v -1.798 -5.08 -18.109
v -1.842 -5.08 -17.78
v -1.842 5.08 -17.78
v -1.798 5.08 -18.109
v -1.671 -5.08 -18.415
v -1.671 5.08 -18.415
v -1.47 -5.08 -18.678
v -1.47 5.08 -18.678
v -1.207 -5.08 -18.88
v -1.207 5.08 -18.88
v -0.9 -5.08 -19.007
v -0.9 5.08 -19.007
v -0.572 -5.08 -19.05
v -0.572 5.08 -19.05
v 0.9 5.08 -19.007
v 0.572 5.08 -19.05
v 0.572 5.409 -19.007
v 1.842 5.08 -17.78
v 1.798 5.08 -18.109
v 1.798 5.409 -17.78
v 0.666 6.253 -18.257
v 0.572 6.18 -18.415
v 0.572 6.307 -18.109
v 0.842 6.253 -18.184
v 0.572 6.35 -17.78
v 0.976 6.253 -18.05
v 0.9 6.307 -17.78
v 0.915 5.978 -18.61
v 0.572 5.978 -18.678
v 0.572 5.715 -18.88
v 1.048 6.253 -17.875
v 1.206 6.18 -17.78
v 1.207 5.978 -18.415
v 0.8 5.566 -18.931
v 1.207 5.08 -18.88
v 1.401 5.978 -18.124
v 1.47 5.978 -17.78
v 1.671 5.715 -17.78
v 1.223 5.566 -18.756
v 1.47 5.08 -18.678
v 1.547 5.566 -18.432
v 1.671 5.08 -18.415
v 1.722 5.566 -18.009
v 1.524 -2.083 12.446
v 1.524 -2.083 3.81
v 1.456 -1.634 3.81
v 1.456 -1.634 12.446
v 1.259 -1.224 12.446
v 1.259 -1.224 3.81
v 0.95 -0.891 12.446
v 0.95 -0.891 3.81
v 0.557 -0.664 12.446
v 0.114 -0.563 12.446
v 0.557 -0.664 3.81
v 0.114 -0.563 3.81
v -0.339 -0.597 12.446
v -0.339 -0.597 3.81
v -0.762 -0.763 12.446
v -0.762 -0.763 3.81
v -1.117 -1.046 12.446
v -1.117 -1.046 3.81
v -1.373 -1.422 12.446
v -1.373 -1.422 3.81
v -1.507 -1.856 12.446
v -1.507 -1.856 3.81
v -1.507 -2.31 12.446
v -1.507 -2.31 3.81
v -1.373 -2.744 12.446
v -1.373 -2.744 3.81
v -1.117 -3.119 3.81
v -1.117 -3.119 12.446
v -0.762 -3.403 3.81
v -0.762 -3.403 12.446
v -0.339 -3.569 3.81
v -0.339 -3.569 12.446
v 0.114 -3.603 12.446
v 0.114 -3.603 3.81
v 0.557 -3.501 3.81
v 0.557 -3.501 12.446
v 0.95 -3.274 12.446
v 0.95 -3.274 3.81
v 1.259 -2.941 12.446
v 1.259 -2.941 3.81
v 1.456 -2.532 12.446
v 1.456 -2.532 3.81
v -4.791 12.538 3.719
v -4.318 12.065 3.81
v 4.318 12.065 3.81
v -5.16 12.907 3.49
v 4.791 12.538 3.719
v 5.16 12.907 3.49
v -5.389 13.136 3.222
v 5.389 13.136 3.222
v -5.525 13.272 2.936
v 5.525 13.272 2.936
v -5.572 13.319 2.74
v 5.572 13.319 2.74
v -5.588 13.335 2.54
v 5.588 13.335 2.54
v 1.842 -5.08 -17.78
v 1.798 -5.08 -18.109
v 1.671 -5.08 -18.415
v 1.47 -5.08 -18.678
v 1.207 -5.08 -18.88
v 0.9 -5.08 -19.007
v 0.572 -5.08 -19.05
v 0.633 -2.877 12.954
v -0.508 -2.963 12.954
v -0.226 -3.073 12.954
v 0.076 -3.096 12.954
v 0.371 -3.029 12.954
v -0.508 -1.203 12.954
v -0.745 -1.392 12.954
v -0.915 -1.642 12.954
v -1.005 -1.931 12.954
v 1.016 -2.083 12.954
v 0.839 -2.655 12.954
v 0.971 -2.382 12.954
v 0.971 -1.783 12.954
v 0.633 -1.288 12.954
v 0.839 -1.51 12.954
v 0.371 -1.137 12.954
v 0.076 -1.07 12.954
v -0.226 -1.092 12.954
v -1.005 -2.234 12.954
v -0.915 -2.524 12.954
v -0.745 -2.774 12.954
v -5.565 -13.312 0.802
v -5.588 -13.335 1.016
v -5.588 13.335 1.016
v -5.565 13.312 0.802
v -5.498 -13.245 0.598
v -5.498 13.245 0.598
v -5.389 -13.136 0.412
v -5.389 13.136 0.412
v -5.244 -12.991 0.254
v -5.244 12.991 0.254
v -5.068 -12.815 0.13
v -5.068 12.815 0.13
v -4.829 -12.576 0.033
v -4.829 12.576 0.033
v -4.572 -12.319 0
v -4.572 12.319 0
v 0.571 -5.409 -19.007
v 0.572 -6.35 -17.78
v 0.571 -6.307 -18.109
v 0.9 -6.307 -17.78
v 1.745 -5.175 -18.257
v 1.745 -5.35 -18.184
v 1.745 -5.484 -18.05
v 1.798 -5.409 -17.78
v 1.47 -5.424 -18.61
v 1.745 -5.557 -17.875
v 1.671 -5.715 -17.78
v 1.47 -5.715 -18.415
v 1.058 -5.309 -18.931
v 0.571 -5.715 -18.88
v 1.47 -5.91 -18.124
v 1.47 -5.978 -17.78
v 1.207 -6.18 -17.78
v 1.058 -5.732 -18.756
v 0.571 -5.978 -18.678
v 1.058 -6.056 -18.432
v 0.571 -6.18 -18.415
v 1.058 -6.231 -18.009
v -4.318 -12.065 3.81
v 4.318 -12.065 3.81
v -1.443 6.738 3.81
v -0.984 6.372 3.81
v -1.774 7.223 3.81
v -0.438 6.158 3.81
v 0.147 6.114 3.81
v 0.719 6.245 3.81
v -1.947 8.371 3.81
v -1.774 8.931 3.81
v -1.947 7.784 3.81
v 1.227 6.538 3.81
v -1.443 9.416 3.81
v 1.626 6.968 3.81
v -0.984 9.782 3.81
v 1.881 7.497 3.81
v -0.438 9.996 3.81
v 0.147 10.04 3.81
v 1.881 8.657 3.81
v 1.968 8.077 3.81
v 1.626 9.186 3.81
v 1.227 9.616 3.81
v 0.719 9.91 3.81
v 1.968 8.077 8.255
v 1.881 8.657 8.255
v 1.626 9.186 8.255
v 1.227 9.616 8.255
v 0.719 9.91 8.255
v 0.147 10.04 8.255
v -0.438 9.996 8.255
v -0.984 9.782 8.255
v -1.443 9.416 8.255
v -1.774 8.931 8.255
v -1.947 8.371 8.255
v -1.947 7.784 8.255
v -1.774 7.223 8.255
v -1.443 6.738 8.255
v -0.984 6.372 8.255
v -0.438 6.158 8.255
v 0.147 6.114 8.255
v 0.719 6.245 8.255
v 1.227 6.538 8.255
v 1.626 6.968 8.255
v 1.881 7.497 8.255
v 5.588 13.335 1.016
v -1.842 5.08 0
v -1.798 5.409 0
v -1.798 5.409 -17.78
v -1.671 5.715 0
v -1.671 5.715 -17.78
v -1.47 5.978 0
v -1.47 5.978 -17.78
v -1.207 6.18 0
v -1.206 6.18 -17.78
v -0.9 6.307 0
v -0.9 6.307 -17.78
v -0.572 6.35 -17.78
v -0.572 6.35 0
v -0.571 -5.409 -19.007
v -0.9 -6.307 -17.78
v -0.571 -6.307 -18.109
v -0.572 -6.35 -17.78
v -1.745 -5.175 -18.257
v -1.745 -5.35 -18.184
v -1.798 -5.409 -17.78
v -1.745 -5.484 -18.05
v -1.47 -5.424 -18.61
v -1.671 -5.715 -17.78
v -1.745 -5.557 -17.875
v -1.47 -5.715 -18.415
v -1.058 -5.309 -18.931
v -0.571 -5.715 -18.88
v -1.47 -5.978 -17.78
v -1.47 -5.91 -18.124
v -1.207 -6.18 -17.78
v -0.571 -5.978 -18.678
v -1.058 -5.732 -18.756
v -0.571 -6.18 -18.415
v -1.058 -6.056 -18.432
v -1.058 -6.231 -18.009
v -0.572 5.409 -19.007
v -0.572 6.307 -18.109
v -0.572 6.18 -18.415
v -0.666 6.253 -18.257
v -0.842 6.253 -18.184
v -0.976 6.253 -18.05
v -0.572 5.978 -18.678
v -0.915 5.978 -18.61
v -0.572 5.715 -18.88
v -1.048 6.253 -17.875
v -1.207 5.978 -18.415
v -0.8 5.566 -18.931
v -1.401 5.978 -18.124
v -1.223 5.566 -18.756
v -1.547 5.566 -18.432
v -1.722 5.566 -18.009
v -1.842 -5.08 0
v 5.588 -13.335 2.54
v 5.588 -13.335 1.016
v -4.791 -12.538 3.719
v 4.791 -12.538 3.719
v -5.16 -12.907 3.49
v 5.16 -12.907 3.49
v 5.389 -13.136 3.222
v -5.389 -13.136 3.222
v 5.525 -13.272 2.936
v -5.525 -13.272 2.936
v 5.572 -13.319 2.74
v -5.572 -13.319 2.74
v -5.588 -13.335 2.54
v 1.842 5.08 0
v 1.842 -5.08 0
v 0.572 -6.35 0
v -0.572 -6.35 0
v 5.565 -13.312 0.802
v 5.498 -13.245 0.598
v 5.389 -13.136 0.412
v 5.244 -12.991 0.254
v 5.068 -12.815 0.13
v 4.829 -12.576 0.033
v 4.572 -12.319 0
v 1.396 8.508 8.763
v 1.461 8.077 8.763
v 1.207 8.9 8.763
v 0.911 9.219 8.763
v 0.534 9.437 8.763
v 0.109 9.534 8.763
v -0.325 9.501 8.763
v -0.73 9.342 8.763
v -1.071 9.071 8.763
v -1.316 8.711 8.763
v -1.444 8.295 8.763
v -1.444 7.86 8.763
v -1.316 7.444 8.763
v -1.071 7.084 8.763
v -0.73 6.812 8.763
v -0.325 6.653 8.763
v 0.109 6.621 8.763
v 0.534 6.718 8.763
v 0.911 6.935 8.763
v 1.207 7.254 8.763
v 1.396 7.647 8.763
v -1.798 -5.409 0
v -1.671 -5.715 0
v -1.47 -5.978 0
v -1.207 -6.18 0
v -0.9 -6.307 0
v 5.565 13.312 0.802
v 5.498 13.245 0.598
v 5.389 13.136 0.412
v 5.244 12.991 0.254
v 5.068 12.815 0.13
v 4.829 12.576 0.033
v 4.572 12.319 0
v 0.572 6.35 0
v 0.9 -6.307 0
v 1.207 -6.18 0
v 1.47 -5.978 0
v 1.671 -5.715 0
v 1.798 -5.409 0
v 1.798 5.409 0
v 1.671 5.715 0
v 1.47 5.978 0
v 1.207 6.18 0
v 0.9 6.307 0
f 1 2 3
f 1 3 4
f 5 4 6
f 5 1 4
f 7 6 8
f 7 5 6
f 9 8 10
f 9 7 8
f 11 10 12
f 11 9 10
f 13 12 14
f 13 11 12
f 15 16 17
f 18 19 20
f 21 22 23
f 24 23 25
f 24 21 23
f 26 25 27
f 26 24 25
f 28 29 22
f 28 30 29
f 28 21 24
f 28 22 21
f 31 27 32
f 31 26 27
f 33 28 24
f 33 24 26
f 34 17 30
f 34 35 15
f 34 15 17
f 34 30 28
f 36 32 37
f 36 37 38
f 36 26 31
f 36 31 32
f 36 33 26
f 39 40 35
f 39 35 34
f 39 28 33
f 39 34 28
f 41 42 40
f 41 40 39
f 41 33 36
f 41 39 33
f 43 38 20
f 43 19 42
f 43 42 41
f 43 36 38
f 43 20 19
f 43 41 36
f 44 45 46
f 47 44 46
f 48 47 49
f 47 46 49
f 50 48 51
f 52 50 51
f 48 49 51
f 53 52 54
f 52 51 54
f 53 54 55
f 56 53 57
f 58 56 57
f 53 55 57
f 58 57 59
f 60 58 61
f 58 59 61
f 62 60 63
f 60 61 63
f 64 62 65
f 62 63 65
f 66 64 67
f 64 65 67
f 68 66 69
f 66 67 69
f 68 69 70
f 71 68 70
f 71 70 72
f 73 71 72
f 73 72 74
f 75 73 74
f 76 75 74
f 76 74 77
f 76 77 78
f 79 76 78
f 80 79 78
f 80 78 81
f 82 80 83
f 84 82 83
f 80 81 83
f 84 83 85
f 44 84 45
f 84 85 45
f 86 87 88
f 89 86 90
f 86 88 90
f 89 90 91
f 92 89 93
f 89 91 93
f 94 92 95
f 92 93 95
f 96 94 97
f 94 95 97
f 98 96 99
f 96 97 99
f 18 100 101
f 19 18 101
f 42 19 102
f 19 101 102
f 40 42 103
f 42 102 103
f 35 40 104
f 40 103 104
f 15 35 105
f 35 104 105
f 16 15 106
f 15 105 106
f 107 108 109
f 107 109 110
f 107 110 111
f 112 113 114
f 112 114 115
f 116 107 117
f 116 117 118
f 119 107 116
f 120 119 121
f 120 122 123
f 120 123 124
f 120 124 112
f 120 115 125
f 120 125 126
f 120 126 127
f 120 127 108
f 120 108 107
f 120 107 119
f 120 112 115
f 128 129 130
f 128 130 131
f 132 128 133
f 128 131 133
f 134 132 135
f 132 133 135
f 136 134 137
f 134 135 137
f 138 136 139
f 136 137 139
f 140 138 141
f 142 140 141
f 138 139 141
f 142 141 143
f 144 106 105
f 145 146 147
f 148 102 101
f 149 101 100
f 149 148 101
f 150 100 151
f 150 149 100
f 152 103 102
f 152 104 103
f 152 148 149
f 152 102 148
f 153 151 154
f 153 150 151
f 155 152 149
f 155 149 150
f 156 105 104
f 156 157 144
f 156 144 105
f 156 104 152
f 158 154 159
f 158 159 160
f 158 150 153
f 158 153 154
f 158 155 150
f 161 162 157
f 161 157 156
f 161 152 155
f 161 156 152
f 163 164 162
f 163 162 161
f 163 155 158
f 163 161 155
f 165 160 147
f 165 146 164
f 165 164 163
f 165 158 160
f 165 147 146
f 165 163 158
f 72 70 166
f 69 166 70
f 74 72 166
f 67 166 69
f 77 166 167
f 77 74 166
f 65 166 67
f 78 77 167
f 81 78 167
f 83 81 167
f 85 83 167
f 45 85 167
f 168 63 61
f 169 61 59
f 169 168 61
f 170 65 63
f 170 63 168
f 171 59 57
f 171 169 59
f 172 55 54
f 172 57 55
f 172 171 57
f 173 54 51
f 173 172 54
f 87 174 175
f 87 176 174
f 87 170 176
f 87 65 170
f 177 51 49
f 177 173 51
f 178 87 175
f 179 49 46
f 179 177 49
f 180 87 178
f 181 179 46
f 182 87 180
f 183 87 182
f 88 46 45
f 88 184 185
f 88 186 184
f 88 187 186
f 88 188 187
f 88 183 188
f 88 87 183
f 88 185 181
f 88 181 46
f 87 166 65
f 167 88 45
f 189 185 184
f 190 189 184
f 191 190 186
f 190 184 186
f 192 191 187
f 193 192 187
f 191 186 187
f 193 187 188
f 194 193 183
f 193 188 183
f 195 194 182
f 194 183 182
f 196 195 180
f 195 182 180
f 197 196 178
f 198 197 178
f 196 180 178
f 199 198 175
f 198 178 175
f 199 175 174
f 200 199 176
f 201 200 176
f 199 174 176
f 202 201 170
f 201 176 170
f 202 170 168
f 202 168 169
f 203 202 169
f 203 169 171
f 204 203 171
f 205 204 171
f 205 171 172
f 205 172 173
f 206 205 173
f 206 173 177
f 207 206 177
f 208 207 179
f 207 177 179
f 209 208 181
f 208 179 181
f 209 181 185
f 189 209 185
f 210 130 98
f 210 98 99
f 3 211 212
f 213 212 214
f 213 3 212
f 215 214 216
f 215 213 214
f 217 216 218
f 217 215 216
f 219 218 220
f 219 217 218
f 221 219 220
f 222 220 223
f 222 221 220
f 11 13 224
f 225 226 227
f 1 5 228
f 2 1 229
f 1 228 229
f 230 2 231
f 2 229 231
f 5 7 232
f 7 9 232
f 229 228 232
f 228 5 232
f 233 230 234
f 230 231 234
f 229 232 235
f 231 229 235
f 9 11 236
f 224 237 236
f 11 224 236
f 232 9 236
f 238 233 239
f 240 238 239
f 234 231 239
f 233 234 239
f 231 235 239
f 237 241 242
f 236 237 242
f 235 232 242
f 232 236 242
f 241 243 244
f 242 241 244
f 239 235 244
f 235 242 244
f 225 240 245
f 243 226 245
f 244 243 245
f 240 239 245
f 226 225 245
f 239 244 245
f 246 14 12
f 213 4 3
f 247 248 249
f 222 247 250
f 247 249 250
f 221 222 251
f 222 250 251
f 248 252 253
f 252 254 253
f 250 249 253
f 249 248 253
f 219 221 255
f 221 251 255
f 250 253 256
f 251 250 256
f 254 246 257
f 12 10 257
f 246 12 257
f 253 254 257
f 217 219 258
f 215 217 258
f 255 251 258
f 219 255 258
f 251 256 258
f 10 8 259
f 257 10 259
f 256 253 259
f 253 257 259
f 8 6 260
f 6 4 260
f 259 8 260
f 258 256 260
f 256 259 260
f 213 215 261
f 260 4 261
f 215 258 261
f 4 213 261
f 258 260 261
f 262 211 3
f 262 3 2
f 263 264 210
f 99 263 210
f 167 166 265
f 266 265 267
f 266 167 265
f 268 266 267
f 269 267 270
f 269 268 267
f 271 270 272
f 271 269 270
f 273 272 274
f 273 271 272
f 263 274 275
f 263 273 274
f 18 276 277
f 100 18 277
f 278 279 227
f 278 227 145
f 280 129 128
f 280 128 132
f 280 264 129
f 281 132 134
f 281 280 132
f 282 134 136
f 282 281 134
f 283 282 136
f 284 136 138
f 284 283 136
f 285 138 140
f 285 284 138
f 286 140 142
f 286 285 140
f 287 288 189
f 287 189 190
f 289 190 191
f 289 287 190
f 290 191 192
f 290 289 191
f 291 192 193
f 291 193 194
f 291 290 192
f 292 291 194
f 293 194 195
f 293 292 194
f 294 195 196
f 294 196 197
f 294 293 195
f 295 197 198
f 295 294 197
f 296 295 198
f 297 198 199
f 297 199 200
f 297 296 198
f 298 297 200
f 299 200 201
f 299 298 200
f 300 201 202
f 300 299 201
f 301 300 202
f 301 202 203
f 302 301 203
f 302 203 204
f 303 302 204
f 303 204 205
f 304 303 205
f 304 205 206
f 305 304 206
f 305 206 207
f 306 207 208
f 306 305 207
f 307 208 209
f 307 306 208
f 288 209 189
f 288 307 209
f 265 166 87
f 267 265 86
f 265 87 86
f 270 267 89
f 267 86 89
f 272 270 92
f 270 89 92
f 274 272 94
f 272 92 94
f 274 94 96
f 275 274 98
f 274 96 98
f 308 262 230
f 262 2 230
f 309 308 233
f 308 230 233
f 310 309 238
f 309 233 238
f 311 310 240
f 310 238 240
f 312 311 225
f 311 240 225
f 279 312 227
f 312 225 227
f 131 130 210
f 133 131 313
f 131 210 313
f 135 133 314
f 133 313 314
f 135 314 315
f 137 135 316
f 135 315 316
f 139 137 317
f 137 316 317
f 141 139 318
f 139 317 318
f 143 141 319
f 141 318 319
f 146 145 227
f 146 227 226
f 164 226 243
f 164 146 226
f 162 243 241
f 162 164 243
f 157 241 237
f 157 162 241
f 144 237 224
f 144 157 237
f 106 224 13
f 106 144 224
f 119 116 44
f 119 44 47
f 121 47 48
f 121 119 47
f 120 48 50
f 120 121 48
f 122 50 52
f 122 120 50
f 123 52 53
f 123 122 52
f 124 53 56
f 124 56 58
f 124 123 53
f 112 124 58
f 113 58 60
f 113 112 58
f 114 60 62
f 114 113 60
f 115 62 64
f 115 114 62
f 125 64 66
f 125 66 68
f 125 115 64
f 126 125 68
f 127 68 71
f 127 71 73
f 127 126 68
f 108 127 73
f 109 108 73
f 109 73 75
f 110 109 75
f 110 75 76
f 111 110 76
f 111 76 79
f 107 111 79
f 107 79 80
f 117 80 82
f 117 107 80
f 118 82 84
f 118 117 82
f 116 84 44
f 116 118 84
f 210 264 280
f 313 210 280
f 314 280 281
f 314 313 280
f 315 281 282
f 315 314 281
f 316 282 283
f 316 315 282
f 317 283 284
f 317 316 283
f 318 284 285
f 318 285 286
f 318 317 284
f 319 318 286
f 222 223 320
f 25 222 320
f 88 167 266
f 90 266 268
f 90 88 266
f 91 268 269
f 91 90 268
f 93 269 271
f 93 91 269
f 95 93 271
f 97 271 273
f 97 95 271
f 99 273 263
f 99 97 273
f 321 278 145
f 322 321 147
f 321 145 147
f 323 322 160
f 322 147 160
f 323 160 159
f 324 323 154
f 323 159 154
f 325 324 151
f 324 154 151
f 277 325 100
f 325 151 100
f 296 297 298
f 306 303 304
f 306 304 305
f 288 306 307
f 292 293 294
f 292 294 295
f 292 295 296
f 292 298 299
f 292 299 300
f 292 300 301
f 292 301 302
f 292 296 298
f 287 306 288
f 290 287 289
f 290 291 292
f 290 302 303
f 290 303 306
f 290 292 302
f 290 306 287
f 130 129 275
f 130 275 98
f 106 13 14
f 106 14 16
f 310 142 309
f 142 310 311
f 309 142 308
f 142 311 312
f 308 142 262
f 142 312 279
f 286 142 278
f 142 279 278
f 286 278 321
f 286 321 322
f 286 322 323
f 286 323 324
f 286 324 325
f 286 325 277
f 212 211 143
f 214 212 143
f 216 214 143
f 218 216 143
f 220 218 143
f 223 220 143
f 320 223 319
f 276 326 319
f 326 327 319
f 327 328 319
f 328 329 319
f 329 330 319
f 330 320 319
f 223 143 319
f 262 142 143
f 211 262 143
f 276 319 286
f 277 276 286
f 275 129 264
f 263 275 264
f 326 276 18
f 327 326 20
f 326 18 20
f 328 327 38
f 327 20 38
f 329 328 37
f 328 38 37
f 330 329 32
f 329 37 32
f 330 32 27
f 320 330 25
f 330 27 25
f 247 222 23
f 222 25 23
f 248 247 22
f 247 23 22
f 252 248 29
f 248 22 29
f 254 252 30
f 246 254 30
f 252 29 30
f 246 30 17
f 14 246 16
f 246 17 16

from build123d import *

# Parameters (mm, degrees)
F0_W     = 11.176
F0_H     = 26.67
F1_DEPTH = 3.81
F2_R     = 1.9685
F3_DEPTH = 4.953
F2_R_2   = 1.524
F4_DEPTH = 9.144
F5_SIZE  = 0.508
F6_R     = 1.27
F7_R     = 1.016
F8_W     = 3.683
F8_H     = 12.7
F9_DEPTH = 19.05
F10_R    = 1.27


with BuildPart() as f1:
    # F0 (on Top) → F1 (new body)
    with BuildSketch(Plane.XY):
        Rectangle(F0_W, F0_H)
    extrude(amount=F1_DEPTH)

    # F2 (on face) → F3 (join)
    with BuildSketch(Plane.XY.offset(3.81)):
        with Locations((0, 8.0772)):
            Circle(F2_R)
    extrude(amount=F3_DEPTH)

    # F2 (on face) → F4 (join)
    with BuildSketch(Plane.XY.offset(3.81)):
        with Locations((0, -2.0828)):
            Circle(F2_R_2)
    extrude(amount=F4_DEPTH)

    # F5
    f5_edges = [f1.edges().sort_by_distance(p)[0] for p in [
        (-1.9685, 8.0772, 8.763),
        (-1.524, -2.0828, 12.954),
    ]]
    chamfer(f5_edges, length=F5_SIZE)

    # F6
    f6_edges = [f1.edges().sort_by_distance(p)[0] for p in [
        (0, 13.335, 3.81),
        (5.588, 0, 3.81),
        (0, -13.335, 3.81),
        (-5.588, 0, 3.81),
    ]]
    fillet(f6_edges, radius=F6_R)

    # F7
    f7_edges = [f1.edges().sort_by_distance(p)[0] for p in [
        (0, 13.335, 0),
        (5.588, 0, 0),
        (0, -13.335, 0),
        (-5.588, 0, 0),
    ]]
    fillet(f7_edges, radius=F7_R)

    # F8 (on face) → F9 (join)
    with BuildSketch(Plane(origin=(0, 0, 0), x_dir=(1, 0, 0), z_dir=(0, 0, -1))):
        Rectangle(F8_W, F8_H)
    extrude(amount=F9_DEPTH)

    # F10
    f10_edges = [f1.edges().sort_by_distance(p)[0] for p in [
        (0, -6.35, -19.05),
        (-1.8415, 0, -19.05),
        (1.8415, 0, -19.05),
        (0, 6.35, -19.05),
        (-1.8415, -6.35, -9.525),
        (1.8415, -6.35, -9.525),
        (1.8415, 6.35, -9.525),
        (-1.8415, 6.35, -9.525),
    ]]
    fillet(f10_edges, radius=F10_R)


solid = f1.part
